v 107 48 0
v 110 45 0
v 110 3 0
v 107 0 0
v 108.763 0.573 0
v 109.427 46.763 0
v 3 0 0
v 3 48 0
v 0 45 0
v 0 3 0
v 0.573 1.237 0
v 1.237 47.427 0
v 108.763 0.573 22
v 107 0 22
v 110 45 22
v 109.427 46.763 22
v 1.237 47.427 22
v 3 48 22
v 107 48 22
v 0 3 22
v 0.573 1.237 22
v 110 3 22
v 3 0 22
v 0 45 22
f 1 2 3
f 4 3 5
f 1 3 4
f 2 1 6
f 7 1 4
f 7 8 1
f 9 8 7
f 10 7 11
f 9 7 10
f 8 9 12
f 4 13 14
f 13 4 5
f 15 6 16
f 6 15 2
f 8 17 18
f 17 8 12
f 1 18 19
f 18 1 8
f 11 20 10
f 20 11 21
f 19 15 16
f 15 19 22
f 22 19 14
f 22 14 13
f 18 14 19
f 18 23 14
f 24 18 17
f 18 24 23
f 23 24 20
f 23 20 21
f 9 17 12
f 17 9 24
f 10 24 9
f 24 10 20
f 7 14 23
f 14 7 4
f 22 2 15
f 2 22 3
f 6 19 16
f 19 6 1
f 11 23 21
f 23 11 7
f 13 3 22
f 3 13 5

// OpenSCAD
// HEPA filter cartridge — exhaust-side post-motor filter, robot vacuum
// ===========================================================================
// BOM anchor (verbatim, upstream commit e840b55 "Sourced vacuum HEPA filters",
// merged into main 2026-09-12; reads verified in the merged tree this run):
//
//   | HEPA filter | 1 | $2-3 | ~20 kPa ~110 x 48 x 22mm | Fits Dreame X50 Pro,
//     X50 Ultra, X50 Master, L40s Pro Ultra, ... Mova V50 Ultra ...
//   |             | 1 | $2-3 | ~36 kPa ~113 x 59 x 12 mm | Fits Roborock Saros
//     10R, Saros Z70, Saros 20 Sonic, ... G30S Pro ...
//   (Saros row corrected ~20 -> ~36 kPa by upstream 79807d9 2026-09-14
//   "BOM: Roborock Saros HEPA filter is 36 kPa"; re-synced from main 2026-09-19.
//    Envelope 113x59x12 unchanged by that commit.)
//   |             | 1 | $2-3 | ~35 kPa ~102/85 x 49 x 26mm | Fits Dreame X60
//     Ultra, X60 Max Ultra, X60 Max Ultra Complete ...
//
// Civilization-level note: these are CONSUMER SPARE PARTS, not factory
// catalog items — no manufacturer datasheet with a dim'd drawing surfaced in
// two rounds of marketplace/vendor searches this run (2026-09-13). The BOM
// envelope numbers above are therefore THE verified basis (upstream's own
// listings), and everything not in them is tagged (estimate) below.
//
// Shape: a pleated-media cartridge in a soft frame. Plan approx rectangular
// (the BOM 2D numbers), medium axis = pleat depth = airflow direction; dirt
// (carrier) side open window, motor side blank or open per variant — the
// clean(seal)-side face treatment is UNKNOWN for all three (estimate).
//
// Variant "x60": length reads "102/85" — implemented as a RIGHT TRAPEZOID
// plan (one long edge 102, opposite 85, width 49 const). Alternative real
// shapes (stepped notch like the Saros 10 filter per the longbotek teardown
// note; parallelogram) selectable via x60_plan below. UNVERIFIED — caliper
// the actual part (MEASURE-ME s23 rows 10-13) before trusting the plan.
//
// Number provenance, inline tags:
//   [B] BOM.md verbatim (commit e840b55 / 64a74cd era, read in merged tree)
//   [X] cross-check from elsewhere in-repo (file+line commented)
//   [E] estimate - verify with calipers (MEASURE-ME.md s23)
//
// Renders (top-level target; override with -D 'part="..."'):
//   openscad -o cartridge_x50.stl hepa-robot-vacuum-filter.scad -D 'part="x50"'
//   part = "x50" | "saros" | "x60" | "compare101"(three ghosted side by side)

// ---------------- BOM-verified envelope inputs [B] ----------------
eps = 0.01;

// [B] "~20 kPa ~110 x 48 x 22mm" — Dreame X50-class
x50_l = 110;  x50_w = 48;  x50_h = 22;
// [B] "~36 kPa ~113 x 59 x 12 mm" — Roborock Saros-class (thinnest: 12)
//     (kPa corrected 20->36 per upstream 79807d9 2026-09-14; dims unchanged)
saros_l = 113; saros_w = 59; saros_h = 12;
// [B] "~35 kPa ~102/85 x 49 x 26mm" — Dreame X60-class (highest dp rating)
x60_l1 = 102; x60_l2 = 85; x60_w = 49; x60_h = 26;

// ---------------- (estimate) construction params ----------------
wall    = 1.5;    // [E] soft-frame wall around the media packet
pleat_p = 3.0;    // [E] pleat pitch, media pack (typ consumer HEPA 2..4 mm)
pleat_t = 0.35;   // [E] media+scrim laminate thickness per fold
window_frac = 0.72;  // [E] open-window fraction of the dirty-side face
lip_h   = 2.0;    // [E] sealing lip height on the clean side
corner_r = 3.0;   // [E] rounded corners (aftermarket packs ship rounded).

// x60 plan reading: "trap" = right trapezoid (default), "rect" = 102x49
// straight (if the 85 turns out to be a notch, not a taper), "notch" =
// stepped rect, notch 17 deep x notch_run long (both [E], caliper first).
x60_plan = "trap";
x60_notch_run = 40;   // [E] run length of the full-height section (notch mode)

part = "x50";

module cartridge(l, w, h, plan = "rect", l2 = undef) {
    // plan outline in XY, extruded to h; window cut on +Z face, media pack in
    mw = w - 2*wall;              // media packet width  [E frame]
    ml = (plan == "trap" ? l2 : l) - 2*wall;
    echo(str("[cartridge] plan ", plan, " L=", l, " l2=", l2,
             " media ", ml, "x", mw, " pleat_p ", pleat_p));
    linear_extrude(height = h)
        shell_2d(l, w, plan, l2);
    // media packet: pleated pack standing in the frame, open to the window
    if (plan == "trap")
        translate([wall, (w - mw)/2 - (l - l2)*0 /*trap taper consumes l2 side*/])
        pleats(ml, mw, h - 2*wall);
    else
        translate([wall, wall]) pleats(ml, mw, h - 2*wall);
    // clean-side lip ring (sealing foot) around the top rim    [E]
    translate([0, 0, h - lip_h])
        linear_extrude(height = lip_h)
            difference() { shell_2d(l, w, plan, l2); offset(delta = -wall) shell_2d(l, w, plan, l2); }
}

module shell_2d(l, w, plan = "rect", l2 = undef) {
    r = corner_r;
    if (plan == "rect")
        offset(r) offset(-r) square([l, w]);
    else if (plan == "trap")
        offset(r) offset(-r)
            polygon([[0, 0], [l, 0], [l2, w], [0, w]]);   // right trapezoid [E]
    else { // notch: full rect minus a corner step 17(x60_l1-x60_l2) x notch_run [E]
        dxx = x60_l1 - x60_l2;   // 17 for the BOM pair 102/85
        offset(r) offset(-r)
            difference() {
                square([l, w]);
                translate([l - x60_notch_run, w]) mirror([0, 1])
                    square([x60_notch_run, dxx]);   // corner step, depth 17 in Y [E]
            }
    }
}

module pleats(ml, mw, hh) {
    n = max(2, floor(ml / pleat_p));
    for (i = [0 : n-1])
        translate([i*pleat_p + (ml - n*pleat_p)/2, 0])
        cube([pleat_t*2, mw, hh]);      // zig-zag idealized as lamellae [E]
}

// ghosted three-up comparison for README/doc renders, 1:1 outlines only
module compare101() {
    x50(); translate([0, x50_w + 6, 0]) saros(); translate([0, x50_w + saros_w + 12, 0]) x60();
}

module x50()  cartridge(x50_l,  x50_w,  x50_h);
module saros() cartridge(saros_l, saros_w, saros_h);
module x60()  cartridge(x60_l1, x60_w, x60_h, plan = x60_plan, l2 = x60_l2);

if (part == "x50") x50();
else if (part == "saros") saros();
else if (part == "x60") x60();
else if (part == "compare101") compare101();
else echo("UNKNOWN part preset");
